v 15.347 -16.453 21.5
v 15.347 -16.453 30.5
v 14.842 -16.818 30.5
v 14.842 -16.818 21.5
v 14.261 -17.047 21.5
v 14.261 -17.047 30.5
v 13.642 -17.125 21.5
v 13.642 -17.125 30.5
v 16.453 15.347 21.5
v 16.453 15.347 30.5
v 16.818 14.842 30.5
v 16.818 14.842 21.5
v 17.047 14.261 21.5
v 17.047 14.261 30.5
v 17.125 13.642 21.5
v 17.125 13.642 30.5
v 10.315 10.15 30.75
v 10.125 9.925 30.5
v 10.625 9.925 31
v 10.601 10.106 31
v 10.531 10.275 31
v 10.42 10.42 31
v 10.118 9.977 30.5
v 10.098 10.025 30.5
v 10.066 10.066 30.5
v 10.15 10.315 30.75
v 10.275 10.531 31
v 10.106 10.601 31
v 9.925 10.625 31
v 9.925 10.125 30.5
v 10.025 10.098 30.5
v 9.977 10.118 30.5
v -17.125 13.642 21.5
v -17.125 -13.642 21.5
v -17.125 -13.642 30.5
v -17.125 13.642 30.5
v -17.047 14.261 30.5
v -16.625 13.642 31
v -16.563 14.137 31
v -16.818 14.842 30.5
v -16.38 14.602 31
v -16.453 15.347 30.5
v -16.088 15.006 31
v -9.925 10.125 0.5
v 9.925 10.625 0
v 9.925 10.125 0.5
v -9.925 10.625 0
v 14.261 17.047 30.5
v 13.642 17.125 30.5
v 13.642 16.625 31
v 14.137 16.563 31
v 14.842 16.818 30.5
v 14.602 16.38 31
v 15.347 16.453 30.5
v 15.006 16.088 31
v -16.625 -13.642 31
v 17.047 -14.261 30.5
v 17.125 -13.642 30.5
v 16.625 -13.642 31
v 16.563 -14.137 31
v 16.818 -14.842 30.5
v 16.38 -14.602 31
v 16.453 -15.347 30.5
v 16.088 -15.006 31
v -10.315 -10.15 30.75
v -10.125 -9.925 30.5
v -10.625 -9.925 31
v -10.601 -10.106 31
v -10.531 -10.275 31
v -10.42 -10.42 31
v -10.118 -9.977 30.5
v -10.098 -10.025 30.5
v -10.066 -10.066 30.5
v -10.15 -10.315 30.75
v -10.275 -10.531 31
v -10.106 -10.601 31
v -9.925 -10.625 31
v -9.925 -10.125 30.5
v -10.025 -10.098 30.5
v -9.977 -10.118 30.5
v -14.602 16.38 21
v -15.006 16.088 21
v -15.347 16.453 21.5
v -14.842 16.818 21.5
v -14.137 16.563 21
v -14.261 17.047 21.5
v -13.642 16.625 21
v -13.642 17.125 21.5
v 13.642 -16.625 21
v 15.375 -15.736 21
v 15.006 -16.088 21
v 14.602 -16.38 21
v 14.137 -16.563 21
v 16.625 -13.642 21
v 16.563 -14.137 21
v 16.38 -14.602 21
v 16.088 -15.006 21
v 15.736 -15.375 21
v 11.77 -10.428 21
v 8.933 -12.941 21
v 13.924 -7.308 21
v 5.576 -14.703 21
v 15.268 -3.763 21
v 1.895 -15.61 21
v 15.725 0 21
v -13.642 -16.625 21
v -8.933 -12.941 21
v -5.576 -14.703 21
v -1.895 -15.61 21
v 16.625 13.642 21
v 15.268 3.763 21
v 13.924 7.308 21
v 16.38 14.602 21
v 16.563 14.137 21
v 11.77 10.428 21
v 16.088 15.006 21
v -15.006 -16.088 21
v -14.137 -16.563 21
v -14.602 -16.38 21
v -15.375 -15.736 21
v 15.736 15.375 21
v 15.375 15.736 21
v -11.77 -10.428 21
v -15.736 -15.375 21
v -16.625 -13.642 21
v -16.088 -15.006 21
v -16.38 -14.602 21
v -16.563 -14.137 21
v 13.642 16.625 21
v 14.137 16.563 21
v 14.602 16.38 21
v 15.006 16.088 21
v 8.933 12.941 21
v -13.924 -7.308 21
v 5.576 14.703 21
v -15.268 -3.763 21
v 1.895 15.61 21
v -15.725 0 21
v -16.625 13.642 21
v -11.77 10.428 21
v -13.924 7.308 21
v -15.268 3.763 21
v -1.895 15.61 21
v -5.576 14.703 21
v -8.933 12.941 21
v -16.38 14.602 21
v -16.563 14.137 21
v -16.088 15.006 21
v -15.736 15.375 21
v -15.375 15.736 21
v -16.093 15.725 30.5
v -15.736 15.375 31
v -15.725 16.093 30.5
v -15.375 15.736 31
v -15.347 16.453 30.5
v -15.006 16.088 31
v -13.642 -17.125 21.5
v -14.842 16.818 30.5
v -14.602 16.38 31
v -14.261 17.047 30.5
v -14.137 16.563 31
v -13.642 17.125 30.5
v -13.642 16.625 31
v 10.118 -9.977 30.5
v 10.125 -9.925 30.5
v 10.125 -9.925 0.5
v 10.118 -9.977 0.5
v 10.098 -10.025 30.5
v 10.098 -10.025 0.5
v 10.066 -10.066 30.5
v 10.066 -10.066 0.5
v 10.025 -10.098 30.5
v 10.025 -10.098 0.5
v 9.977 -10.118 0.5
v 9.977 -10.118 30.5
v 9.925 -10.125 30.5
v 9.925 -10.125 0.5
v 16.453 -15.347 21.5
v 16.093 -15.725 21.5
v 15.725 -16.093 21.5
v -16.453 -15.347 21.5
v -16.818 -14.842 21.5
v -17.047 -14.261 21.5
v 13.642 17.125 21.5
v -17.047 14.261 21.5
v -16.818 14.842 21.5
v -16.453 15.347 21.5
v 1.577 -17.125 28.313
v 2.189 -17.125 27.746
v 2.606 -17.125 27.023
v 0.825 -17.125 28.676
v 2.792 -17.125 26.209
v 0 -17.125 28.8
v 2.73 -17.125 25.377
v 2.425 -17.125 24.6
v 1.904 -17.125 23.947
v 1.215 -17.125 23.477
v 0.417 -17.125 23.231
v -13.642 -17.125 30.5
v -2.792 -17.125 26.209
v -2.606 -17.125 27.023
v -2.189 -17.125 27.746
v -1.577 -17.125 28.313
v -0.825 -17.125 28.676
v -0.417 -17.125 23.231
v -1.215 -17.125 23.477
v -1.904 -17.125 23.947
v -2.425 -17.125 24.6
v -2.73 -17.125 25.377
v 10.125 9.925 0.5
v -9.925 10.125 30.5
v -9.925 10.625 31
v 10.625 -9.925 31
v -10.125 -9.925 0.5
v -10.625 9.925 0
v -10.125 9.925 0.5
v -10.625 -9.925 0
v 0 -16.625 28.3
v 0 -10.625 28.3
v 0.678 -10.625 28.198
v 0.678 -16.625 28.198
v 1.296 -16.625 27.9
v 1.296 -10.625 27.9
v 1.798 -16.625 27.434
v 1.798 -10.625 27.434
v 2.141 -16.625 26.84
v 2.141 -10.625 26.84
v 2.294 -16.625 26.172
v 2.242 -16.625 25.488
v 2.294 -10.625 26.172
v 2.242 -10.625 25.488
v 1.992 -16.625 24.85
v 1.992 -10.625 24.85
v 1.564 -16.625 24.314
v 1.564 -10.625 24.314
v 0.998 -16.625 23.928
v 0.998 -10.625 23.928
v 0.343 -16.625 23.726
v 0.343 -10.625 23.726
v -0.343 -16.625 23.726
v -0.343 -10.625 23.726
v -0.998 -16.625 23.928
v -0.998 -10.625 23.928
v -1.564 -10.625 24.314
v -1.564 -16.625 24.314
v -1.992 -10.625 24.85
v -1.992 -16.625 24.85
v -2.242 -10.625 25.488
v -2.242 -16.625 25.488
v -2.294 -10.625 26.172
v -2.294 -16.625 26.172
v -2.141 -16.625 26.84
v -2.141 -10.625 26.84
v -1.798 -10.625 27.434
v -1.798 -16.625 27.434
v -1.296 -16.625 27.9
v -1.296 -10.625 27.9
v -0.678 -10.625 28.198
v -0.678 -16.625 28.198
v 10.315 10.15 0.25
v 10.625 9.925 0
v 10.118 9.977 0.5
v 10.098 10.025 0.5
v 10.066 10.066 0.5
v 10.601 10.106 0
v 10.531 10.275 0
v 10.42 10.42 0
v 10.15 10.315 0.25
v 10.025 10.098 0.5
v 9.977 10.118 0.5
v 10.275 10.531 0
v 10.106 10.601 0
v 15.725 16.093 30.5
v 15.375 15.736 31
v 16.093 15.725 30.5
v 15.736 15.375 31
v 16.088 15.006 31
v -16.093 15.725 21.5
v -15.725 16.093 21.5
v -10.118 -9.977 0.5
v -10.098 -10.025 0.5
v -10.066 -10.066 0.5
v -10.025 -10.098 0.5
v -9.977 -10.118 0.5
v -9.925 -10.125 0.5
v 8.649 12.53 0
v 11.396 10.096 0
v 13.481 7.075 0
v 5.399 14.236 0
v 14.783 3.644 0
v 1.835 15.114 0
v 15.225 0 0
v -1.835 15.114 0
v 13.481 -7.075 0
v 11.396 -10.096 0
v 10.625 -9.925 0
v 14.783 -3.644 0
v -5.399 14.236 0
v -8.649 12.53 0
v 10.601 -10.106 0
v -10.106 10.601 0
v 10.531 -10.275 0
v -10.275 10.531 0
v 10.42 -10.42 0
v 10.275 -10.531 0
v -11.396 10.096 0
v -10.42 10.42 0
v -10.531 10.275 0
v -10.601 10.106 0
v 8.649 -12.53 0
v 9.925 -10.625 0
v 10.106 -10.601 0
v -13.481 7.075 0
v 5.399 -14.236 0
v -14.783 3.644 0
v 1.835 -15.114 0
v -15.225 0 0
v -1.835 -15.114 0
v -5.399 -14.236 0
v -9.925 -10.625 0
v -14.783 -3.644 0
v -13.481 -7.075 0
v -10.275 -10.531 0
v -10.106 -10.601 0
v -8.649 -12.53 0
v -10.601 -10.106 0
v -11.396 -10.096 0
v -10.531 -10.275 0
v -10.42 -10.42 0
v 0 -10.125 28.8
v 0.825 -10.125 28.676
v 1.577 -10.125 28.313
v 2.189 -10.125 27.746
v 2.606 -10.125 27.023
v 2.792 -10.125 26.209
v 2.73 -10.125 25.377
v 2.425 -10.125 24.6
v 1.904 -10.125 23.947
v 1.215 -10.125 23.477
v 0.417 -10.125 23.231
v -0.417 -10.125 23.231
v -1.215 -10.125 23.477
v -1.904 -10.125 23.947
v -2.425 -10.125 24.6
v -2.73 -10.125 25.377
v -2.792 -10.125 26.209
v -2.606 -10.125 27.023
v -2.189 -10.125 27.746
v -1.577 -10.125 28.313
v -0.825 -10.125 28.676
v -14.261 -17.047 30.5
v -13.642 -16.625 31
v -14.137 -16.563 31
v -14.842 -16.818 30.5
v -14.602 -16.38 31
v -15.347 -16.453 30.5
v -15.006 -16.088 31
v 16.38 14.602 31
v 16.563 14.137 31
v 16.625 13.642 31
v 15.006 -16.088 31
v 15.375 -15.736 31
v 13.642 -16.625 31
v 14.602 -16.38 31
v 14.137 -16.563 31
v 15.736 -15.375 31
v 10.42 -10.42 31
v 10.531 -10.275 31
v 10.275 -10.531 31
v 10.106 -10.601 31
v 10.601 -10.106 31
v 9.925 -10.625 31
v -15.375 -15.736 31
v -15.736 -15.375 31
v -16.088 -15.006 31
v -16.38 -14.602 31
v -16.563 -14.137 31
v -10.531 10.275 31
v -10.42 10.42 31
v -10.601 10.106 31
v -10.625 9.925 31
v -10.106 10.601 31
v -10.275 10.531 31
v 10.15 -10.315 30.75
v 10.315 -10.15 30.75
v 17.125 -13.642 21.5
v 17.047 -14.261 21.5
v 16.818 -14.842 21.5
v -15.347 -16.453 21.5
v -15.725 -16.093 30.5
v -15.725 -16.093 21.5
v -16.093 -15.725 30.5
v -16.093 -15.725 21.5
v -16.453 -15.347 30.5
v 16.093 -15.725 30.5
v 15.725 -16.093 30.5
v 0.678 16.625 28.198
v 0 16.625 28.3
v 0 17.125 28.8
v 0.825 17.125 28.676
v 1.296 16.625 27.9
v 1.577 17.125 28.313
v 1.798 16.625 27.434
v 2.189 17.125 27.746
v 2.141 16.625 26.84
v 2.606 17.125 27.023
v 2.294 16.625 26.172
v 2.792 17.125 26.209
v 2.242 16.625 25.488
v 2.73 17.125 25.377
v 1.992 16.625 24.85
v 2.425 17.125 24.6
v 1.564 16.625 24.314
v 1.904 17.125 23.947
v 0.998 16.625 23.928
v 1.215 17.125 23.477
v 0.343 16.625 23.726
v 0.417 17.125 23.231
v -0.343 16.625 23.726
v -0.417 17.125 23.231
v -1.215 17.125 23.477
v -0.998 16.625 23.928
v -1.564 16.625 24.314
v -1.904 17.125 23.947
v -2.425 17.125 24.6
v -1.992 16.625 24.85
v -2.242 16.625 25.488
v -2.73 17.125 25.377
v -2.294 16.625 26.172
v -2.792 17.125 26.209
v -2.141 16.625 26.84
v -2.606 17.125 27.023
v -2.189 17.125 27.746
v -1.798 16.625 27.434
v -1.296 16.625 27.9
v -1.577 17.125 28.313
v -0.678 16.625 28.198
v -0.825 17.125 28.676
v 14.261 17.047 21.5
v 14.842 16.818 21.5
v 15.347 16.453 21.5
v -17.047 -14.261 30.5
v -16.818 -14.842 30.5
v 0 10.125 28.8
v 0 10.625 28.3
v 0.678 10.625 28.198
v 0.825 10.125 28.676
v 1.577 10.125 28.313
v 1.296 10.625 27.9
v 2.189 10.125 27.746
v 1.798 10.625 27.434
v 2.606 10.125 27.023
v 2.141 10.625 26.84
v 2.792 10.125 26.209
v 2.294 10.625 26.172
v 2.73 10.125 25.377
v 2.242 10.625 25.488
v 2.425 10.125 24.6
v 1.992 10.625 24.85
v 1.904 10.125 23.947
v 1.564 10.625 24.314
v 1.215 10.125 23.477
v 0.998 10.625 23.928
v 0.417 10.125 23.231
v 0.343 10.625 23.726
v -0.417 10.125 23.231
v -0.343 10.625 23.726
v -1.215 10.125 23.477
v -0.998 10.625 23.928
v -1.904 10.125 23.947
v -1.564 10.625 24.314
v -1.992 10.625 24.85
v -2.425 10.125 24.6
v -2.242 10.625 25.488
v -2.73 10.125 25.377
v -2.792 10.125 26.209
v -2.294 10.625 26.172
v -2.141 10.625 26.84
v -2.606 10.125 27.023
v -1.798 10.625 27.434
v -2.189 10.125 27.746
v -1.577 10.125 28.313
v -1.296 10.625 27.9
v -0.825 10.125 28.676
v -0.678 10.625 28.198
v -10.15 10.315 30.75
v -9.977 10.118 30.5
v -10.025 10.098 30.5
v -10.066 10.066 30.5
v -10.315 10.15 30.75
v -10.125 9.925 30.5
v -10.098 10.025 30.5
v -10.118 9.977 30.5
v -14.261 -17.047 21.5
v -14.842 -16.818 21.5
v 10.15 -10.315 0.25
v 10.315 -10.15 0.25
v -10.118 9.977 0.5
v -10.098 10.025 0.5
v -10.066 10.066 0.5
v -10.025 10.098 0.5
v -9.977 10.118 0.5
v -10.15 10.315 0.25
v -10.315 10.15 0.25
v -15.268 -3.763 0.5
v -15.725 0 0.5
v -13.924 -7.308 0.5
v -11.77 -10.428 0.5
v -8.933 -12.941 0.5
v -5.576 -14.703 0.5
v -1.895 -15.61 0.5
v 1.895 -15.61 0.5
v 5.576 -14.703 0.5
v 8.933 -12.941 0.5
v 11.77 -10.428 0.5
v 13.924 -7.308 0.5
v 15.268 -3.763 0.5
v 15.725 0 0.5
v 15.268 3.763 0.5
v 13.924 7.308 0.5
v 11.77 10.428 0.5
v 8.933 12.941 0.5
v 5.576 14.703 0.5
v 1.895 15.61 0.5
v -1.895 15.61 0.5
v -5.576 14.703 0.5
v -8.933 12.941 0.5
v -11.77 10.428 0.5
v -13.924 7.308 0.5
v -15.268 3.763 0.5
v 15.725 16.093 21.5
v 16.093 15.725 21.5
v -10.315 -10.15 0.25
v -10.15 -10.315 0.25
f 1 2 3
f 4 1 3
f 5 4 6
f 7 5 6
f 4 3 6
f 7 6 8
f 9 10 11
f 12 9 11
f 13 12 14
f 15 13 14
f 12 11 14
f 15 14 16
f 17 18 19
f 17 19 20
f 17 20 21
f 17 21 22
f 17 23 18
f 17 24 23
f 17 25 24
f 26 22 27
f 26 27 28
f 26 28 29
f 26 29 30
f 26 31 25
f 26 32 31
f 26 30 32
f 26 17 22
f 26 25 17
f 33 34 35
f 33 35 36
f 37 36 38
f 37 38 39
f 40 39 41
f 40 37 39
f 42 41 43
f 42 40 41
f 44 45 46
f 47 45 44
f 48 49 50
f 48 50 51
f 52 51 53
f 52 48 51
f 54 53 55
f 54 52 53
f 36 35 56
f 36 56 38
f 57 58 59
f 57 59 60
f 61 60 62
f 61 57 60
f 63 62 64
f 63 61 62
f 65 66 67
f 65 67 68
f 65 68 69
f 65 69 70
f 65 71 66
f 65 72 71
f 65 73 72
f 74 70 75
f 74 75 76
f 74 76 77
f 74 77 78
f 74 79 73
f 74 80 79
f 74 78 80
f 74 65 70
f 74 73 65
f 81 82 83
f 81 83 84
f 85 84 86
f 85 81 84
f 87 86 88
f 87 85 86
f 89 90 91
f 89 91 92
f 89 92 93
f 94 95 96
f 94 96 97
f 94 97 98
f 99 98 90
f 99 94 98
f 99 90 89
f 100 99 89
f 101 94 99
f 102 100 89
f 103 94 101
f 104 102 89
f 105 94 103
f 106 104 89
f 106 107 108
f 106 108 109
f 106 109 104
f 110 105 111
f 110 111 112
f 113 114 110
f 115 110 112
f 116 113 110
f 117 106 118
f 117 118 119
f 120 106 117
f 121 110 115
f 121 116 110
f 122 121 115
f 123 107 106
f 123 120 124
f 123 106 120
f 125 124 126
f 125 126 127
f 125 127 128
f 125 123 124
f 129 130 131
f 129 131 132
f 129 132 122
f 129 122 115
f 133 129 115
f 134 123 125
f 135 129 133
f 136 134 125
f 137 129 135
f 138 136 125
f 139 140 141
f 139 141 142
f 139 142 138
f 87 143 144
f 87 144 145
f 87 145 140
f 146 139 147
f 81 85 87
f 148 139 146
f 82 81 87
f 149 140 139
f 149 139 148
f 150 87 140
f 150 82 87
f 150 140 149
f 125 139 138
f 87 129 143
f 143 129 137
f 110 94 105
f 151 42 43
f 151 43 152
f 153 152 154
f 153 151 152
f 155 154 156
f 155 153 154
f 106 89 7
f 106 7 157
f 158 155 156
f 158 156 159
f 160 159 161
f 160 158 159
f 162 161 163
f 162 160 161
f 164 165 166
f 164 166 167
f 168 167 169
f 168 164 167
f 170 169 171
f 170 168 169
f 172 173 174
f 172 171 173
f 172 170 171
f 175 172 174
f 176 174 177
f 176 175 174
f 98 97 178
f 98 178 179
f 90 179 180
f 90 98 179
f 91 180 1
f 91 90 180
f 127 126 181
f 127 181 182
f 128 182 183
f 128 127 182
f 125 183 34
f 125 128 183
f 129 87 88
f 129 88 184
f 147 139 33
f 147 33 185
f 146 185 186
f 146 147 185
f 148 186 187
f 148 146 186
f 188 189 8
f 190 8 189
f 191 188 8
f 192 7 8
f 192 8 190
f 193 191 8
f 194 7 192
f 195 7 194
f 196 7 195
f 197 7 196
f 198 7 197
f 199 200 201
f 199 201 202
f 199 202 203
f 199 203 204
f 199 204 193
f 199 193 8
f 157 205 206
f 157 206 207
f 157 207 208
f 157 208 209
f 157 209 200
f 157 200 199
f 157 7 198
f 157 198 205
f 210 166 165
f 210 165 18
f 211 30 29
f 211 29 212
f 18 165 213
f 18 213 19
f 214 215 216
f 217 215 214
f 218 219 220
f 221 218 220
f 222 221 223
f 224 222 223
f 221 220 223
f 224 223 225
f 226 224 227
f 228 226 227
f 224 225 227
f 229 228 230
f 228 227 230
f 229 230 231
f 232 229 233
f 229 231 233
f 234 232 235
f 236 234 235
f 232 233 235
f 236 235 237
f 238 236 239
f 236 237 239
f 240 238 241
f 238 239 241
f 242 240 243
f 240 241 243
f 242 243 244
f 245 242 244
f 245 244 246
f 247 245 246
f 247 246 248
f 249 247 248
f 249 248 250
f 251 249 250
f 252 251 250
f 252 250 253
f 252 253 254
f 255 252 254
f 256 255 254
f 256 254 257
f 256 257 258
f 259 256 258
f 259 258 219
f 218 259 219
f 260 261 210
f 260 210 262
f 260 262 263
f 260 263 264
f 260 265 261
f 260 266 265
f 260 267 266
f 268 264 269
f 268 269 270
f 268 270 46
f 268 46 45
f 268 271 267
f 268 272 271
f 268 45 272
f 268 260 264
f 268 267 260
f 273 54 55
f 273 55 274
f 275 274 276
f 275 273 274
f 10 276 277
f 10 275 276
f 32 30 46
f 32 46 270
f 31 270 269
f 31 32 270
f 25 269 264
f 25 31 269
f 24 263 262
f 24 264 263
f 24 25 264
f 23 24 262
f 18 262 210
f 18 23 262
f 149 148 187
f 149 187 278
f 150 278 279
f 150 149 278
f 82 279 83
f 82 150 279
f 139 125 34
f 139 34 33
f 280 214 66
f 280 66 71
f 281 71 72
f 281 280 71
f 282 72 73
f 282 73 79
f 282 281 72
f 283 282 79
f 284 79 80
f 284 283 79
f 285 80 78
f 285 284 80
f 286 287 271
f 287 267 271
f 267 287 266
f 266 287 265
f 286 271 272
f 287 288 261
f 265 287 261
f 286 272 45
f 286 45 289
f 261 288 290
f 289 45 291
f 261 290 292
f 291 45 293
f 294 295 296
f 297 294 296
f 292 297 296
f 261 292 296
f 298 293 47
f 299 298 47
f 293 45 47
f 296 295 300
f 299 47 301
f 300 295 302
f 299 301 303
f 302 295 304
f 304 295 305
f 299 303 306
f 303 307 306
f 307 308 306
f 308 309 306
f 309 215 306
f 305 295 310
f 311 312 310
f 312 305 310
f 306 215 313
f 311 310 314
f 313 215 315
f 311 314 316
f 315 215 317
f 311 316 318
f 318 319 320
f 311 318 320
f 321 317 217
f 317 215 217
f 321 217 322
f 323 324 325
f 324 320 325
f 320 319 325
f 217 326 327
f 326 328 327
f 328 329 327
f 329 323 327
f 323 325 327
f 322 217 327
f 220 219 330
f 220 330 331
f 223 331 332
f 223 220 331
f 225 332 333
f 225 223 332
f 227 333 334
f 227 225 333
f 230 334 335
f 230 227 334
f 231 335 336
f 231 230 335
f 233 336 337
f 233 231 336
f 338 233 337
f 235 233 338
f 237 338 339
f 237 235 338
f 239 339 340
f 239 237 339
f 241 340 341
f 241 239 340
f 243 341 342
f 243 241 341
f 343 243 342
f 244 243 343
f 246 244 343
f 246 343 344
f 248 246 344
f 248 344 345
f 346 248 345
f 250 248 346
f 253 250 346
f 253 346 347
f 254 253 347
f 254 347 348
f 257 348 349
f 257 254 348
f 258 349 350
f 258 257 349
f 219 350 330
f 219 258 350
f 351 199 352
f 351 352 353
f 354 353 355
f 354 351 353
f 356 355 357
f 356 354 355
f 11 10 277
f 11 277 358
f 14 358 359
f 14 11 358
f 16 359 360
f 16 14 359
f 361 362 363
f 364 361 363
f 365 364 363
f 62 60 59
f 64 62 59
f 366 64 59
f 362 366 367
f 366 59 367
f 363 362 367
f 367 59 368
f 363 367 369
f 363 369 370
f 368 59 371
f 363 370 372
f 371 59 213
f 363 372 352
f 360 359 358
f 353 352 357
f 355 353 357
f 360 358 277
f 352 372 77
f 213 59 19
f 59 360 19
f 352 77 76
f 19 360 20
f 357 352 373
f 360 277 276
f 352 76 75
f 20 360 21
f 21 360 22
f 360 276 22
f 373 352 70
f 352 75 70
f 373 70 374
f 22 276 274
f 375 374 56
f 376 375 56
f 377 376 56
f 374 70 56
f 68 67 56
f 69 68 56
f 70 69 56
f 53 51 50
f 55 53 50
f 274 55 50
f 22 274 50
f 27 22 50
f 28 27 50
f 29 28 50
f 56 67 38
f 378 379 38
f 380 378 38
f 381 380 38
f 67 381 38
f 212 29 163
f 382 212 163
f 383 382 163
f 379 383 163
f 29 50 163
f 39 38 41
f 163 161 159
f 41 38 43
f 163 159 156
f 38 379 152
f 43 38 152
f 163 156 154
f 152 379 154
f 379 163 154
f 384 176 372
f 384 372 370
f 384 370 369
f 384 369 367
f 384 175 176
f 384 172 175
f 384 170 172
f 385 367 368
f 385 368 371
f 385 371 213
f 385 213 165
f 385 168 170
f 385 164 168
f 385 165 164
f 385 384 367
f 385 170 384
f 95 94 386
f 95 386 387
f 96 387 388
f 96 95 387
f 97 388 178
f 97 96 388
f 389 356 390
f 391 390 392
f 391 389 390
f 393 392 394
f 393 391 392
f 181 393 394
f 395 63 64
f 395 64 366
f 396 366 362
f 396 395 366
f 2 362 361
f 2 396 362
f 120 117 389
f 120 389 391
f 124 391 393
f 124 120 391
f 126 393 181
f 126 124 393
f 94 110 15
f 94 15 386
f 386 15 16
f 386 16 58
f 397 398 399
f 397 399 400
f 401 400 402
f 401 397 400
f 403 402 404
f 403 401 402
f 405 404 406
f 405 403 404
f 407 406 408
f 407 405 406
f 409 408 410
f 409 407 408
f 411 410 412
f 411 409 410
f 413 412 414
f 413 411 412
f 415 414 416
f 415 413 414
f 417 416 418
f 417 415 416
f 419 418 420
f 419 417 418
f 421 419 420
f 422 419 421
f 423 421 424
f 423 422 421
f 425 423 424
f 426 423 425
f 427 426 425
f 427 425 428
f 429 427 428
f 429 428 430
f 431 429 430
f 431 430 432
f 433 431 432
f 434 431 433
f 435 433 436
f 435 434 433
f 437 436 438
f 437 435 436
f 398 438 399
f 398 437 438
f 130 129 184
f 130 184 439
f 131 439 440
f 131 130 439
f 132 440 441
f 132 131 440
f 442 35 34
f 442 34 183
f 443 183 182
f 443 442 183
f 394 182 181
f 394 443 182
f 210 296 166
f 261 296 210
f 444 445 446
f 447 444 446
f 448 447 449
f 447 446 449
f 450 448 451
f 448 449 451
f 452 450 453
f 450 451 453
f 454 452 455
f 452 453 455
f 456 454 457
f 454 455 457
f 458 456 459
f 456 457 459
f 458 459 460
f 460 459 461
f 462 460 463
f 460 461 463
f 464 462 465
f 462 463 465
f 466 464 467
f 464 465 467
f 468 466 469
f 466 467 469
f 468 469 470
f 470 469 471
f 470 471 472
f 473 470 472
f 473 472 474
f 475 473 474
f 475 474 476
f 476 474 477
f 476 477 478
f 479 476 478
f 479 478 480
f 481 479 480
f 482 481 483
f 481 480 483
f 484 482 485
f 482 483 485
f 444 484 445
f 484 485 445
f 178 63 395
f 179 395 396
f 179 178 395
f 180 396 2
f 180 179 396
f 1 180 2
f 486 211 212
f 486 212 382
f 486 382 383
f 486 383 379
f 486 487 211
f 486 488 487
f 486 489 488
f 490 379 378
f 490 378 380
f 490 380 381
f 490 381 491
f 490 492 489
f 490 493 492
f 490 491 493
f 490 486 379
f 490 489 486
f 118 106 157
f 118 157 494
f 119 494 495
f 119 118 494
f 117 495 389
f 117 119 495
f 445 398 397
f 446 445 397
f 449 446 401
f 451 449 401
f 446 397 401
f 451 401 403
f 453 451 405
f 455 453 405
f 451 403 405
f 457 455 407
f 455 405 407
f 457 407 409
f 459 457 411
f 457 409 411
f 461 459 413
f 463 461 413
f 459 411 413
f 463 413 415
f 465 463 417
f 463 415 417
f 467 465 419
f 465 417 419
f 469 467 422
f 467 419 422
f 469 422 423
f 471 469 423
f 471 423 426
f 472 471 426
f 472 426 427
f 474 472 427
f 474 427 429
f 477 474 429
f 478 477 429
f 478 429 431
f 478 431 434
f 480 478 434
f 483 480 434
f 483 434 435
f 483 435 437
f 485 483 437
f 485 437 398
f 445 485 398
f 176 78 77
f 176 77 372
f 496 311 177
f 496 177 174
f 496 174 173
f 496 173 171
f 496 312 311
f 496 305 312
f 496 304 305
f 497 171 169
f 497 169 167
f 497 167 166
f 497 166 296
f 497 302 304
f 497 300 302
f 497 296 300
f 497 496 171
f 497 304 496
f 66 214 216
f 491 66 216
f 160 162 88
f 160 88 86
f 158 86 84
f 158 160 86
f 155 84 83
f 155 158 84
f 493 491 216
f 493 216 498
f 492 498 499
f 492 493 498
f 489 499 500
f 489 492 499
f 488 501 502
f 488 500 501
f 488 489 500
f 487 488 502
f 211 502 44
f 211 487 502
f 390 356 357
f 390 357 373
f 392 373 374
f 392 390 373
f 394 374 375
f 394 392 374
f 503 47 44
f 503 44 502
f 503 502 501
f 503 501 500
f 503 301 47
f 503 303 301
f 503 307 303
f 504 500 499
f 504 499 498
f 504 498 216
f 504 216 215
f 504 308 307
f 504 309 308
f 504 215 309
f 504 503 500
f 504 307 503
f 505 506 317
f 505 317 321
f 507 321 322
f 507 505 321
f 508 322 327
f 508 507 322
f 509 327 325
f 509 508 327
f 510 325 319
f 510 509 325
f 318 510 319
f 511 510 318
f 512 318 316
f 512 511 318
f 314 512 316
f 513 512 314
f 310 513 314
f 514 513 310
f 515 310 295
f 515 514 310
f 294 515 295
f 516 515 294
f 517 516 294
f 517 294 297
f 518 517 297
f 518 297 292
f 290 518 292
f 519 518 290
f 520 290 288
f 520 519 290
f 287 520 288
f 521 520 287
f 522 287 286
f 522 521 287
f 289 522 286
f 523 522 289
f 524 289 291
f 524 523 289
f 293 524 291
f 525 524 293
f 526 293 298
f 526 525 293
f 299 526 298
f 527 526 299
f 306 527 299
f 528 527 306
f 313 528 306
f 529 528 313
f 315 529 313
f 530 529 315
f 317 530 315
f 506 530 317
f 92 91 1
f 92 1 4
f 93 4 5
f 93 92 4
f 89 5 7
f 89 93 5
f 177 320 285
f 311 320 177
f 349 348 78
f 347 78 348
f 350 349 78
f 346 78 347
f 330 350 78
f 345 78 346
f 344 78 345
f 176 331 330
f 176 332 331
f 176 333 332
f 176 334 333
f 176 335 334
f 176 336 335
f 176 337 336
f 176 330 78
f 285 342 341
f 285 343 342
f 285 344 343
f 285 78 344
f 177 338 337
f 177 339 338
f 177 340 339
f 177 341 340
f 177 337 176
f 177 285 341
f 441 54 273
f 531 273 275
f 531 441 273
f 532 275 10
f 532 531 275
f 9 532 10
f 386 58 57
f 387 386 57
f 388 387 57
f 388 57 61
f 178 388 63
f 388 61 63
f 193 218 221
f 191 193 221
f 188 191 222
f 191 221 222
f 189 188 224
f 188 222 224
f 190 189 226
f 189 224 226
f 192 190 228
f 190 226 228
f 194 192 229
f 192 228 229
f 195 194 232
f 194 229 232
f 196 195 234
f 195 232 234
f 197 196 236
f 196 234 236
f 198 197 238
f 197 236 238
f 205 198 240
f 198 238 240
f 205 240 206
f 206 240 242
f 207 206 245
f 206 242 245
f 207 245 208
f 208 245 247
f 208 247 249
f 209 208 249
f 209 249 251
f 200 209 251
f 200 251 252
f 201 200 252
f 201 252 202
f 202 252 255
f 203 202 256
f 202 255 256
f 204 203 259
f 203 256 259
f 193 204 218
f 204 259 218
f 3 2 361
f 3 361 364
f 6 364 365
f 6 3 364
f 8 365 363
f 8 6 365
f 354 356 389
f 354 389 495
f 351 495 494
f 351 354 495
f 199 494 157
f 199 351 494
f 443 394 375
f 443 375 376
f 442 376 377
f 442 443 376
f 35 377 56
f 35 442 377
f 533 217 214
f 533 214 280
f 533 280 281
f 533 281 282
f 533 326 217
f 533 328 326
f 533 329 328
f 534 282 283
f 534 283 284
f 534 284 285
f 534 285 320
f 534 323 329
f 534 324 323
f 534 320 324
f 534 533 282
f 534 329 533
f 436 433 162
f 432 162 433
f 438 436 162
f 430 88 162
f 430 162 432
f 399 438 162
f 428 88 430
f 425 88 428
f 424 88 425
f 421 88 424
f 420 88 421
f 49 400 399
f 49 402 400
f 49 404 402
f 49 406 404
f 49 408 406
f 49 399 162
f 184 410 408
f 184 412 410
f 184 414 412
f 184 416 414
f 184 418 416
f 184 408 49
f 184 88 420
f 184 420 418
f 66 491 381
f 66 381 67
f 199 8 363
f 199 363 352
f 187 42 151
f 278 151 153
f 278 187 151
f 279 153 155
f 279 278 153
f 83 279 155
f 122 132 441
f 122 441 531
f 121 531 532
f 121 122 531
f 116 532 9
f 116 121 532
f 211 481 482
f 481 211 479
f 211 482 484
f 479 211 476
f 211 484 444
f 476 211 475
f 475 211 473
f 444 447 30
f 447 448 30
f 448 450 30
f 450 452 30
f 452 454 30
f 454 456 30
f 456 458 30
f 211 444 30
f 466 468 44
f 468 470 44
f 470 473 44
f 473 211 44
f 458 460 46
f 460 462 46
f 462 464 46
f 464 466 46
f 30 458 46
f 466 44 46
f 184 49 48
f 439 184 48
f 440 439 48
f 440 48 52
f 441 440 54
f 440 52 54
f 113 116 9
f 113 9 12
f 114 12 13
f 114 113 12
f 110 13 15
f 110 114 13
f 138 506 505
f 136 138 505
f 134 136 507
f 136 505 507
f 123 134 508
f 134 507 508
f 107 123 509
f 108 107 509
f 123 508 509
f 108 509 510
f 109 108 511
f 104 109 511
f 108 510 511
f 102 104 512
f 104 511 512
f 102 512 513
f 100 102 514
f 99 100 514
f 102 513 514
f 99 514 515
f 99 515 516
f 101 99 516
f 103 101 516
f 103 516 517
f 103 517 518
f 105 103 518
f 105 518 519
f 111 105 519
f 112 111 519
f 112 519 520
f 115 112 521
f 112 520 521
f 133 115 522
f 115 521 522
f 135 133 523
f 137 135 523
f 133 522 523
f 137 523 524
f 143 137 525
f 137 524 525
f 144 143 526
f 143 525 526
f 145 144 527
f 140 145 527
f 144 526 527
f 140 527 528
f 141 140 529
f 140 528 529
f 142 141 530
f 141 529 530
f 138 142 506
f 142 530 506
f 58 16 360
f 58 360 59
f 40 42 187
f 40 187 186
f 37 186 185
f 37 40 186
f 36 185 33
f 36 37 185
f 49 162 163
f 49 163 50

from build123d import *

# Parameters (mm, degrees)
SKIZZE1_R                       = 15.725
SKIZZE1_W                       = 20.25
SKIZZE1_H                       = 20.25
AUFSATZ_LINEAR_AUSTRAGEN1_DEPTH = 21
SKIZZE2_W                       = 20.25
SKIZZE2_H                       = 20.25
AUFSATZ_LINEAR_AUSTRAGEN2_DEPTH = 10
SKIZZE3_R                       = 2.3
SCHNITT_LINEAR_AUSTRAGEN1_DEPTH = 50.267921866
VERRUNDUNG1_R                   = 0.2
VERRUNDUNG2_R                   = 2.5
FASE1_SIZE                      = 0.5
FASE4_SIZE                      = 0.5


with BuildPart() as part:
    # Skizze1 → Aufsatz-Linear austragen1 (new body)
    with BuildSketch(Plane.XY):
        with Locations(Location((0, 0, 0), (0, 0, 180))):
            Circle(SKIZZE1_R)
        Rectangle(SKIZZE1_W, SKIZZE1_H, mode=Mode.SUBTRACT)
    extrude(amount=AUFSATZ_LINEAR_AUSTRAGEN1_DEPTH)

    # Skizze2 → Aufsatz-Linear austragen2 (add)
    with BuildSketch(Plane.XY.offset(21)):
        with BuildLine():
            Line((-14.593984206, 17.125), (14.593984206, 17.125))
            ThreePointArc((14.593984206, 17.125), (15.909902577, 15.909902577), (17.125, 14.593984206))
            Line((17.125, 14.593984206), (17.125, -14.593984206))
            ThreePointArc((17.125, -14.593984206), (15.909902577, -15.909902577), (14.593984206, -17.125))
            Line((14.593984206, -17.125), (-14.593984206, -17.125))
            ThreePointArc((-14.593984206, -17.125), (-15.909902577, -15.909902577), (-17.125, -14.593984206))
            Line((-17.125, -14.593984206), (-17.125, 14.593984206))
            ThreePointArc((-17.125, 14.593984206), (-15.909902577, 15.909902577), (-14.593984206, 17.125))
        make_face()
        Rectangle(SKIZZE2_W, SKIZZE2_H, mode=Mode.SUBTRACT)
    extrude(amount=AUFSATZ_LINEAR_AUSTRAGEN2_DEPTH)

    # Skizze3 → Schnitt-Linear austragen1 (cut, through all)
    with BuildSketch(Plane(origin=(0, 17.125, 0), x_dir=(1, 0, 0), z_dir=(0, 1, 0))):
        with Locations(Location((0, -26, 0), (0, 0, 270))):
            Circle(SKIZZE3_R)
    extrude(amount=-SCHNITT_LINEAR_AUSTRAGEN1_DEPTH, mode=Mode.SUBTRACT)

    # Verrundung1
    verrundung1_edges = [part.edges().sort_by_distance(p)[0] for p in [
        (10.125, -10.125, 15.5),
        (10.125, 10.125, 15.5),
        (-10.125, 10.125, 15.5),
        (-10.125, -10.125, 15.5),
    ]]
    fillet(verrundung1_edges, radius=VERRUNDUNG1_R)

    # Verrundung2
    verrundung2_edges = [part.edges().sort_by_distance(p)[0] for p in [
        (-14.593984206, 17.125, 26),
        (-17.125, 14.593984206, 26),
        (-17.125, -14.593984206, 26),
        (-14.593984206, -17.125, 26),
        (14.593984206, -17.125, 26),
        (17.125, -14.593984206, 26),
        (17.125, 14.593984206, 26),
        (14.593984206, 17.125, 26),
    ]]
    fillet(verrundung2_edges, radius=VERRUNDUNG2_R)

    # Fase1
    fase1_edges = [part.edges().sort_by_distance(p)[0] for p in [
        (0, 17.125, 31),
        (-14.558620883, 16.950974258, 31),
        (-16.950974258, 14.558620883, 31),
        (14.558620883, 16.950974258, 31),
        (16.950974258, 14.558620883, 31),
        (16.950974258, -14.558620883, 31),
        (14.558620883, -16.950974258, 31),
        (-14.558620883, -16.950974258, 31),
        (-16.950974258, -14.558620883, 31),
        (15.725, 0, 0),
        (0, -10.125, 23.7),
        (0, 10.125, 23.7),
        (0, -17.125, 23.7),
        (0, 17.125, 23.7),
        (0, -10.125, 0),
        (0, -10.125, 31),
        (10.125, 0, 0),
        (10.125, 0, 31),
        (-10.125, 0, 0),
        (-10.125, 0, 31),
        (0, 10.125, 0),
        (0, 10.125, 31),
        (10.066421356, -10.066421356, 0),
        (10.066421356, -10.066421356, 31),
        (-10.066421356, -10.066421356, 0),
        (-10.066421356, -10.066421356, 31),
        (-10.066421356, 10.066421356, 0),
        (-10.066421356, 10.066421356, 31),
        (10.066421356, 10.066421356, 0),
        (10.066421356, 10.066421356, 31),
        (-15.909902577, -15.909902577, 31),
        (-17.125, 0, 31),
        (-15.909902577, 15.909902577, 31),
        (0, -17.125, 31),
        (15.909902577, -15.909902577, 31),
        (17.125, 0, 31),
        (15.909902577, 15.909902577, 31),
    ]]
    chamfer(fase1_edges, length=FASE1_SIZE)

    # Fase4
    fase4_edges = [part.edges().sort_by_distance(p)[0] for p in [
        (-15.909902577, -15.909902577, 21),
        (-15.909902577, 15.909902577, 21),
        (0, 17.125, 21),
        (15.909902577, 15.909902577, 21),
        (17.125, 0, 21),
        (15.909902577, -15.909902577, 21),
        (0, -17.125, 21),
        (-17.125, 0, 21),
        (-14.558620883, 16.950974258, 21),
        (-16.950974258, 14.558620883, 21),
        (14.558620883, 16.950974258, 21),
        (16.950974258, 14.558620883, 21),
        (16.950974258, -14.558620883, 21),
        (14.558620883, -16.950974258, 21),
        (-14.558620883, -16.950974258, 21),
        (-16.950974258, -14.558620883, 21),
    ]]
    chamfer(fase4_edges, length=FASE4_SIZE)


solid = part.part
